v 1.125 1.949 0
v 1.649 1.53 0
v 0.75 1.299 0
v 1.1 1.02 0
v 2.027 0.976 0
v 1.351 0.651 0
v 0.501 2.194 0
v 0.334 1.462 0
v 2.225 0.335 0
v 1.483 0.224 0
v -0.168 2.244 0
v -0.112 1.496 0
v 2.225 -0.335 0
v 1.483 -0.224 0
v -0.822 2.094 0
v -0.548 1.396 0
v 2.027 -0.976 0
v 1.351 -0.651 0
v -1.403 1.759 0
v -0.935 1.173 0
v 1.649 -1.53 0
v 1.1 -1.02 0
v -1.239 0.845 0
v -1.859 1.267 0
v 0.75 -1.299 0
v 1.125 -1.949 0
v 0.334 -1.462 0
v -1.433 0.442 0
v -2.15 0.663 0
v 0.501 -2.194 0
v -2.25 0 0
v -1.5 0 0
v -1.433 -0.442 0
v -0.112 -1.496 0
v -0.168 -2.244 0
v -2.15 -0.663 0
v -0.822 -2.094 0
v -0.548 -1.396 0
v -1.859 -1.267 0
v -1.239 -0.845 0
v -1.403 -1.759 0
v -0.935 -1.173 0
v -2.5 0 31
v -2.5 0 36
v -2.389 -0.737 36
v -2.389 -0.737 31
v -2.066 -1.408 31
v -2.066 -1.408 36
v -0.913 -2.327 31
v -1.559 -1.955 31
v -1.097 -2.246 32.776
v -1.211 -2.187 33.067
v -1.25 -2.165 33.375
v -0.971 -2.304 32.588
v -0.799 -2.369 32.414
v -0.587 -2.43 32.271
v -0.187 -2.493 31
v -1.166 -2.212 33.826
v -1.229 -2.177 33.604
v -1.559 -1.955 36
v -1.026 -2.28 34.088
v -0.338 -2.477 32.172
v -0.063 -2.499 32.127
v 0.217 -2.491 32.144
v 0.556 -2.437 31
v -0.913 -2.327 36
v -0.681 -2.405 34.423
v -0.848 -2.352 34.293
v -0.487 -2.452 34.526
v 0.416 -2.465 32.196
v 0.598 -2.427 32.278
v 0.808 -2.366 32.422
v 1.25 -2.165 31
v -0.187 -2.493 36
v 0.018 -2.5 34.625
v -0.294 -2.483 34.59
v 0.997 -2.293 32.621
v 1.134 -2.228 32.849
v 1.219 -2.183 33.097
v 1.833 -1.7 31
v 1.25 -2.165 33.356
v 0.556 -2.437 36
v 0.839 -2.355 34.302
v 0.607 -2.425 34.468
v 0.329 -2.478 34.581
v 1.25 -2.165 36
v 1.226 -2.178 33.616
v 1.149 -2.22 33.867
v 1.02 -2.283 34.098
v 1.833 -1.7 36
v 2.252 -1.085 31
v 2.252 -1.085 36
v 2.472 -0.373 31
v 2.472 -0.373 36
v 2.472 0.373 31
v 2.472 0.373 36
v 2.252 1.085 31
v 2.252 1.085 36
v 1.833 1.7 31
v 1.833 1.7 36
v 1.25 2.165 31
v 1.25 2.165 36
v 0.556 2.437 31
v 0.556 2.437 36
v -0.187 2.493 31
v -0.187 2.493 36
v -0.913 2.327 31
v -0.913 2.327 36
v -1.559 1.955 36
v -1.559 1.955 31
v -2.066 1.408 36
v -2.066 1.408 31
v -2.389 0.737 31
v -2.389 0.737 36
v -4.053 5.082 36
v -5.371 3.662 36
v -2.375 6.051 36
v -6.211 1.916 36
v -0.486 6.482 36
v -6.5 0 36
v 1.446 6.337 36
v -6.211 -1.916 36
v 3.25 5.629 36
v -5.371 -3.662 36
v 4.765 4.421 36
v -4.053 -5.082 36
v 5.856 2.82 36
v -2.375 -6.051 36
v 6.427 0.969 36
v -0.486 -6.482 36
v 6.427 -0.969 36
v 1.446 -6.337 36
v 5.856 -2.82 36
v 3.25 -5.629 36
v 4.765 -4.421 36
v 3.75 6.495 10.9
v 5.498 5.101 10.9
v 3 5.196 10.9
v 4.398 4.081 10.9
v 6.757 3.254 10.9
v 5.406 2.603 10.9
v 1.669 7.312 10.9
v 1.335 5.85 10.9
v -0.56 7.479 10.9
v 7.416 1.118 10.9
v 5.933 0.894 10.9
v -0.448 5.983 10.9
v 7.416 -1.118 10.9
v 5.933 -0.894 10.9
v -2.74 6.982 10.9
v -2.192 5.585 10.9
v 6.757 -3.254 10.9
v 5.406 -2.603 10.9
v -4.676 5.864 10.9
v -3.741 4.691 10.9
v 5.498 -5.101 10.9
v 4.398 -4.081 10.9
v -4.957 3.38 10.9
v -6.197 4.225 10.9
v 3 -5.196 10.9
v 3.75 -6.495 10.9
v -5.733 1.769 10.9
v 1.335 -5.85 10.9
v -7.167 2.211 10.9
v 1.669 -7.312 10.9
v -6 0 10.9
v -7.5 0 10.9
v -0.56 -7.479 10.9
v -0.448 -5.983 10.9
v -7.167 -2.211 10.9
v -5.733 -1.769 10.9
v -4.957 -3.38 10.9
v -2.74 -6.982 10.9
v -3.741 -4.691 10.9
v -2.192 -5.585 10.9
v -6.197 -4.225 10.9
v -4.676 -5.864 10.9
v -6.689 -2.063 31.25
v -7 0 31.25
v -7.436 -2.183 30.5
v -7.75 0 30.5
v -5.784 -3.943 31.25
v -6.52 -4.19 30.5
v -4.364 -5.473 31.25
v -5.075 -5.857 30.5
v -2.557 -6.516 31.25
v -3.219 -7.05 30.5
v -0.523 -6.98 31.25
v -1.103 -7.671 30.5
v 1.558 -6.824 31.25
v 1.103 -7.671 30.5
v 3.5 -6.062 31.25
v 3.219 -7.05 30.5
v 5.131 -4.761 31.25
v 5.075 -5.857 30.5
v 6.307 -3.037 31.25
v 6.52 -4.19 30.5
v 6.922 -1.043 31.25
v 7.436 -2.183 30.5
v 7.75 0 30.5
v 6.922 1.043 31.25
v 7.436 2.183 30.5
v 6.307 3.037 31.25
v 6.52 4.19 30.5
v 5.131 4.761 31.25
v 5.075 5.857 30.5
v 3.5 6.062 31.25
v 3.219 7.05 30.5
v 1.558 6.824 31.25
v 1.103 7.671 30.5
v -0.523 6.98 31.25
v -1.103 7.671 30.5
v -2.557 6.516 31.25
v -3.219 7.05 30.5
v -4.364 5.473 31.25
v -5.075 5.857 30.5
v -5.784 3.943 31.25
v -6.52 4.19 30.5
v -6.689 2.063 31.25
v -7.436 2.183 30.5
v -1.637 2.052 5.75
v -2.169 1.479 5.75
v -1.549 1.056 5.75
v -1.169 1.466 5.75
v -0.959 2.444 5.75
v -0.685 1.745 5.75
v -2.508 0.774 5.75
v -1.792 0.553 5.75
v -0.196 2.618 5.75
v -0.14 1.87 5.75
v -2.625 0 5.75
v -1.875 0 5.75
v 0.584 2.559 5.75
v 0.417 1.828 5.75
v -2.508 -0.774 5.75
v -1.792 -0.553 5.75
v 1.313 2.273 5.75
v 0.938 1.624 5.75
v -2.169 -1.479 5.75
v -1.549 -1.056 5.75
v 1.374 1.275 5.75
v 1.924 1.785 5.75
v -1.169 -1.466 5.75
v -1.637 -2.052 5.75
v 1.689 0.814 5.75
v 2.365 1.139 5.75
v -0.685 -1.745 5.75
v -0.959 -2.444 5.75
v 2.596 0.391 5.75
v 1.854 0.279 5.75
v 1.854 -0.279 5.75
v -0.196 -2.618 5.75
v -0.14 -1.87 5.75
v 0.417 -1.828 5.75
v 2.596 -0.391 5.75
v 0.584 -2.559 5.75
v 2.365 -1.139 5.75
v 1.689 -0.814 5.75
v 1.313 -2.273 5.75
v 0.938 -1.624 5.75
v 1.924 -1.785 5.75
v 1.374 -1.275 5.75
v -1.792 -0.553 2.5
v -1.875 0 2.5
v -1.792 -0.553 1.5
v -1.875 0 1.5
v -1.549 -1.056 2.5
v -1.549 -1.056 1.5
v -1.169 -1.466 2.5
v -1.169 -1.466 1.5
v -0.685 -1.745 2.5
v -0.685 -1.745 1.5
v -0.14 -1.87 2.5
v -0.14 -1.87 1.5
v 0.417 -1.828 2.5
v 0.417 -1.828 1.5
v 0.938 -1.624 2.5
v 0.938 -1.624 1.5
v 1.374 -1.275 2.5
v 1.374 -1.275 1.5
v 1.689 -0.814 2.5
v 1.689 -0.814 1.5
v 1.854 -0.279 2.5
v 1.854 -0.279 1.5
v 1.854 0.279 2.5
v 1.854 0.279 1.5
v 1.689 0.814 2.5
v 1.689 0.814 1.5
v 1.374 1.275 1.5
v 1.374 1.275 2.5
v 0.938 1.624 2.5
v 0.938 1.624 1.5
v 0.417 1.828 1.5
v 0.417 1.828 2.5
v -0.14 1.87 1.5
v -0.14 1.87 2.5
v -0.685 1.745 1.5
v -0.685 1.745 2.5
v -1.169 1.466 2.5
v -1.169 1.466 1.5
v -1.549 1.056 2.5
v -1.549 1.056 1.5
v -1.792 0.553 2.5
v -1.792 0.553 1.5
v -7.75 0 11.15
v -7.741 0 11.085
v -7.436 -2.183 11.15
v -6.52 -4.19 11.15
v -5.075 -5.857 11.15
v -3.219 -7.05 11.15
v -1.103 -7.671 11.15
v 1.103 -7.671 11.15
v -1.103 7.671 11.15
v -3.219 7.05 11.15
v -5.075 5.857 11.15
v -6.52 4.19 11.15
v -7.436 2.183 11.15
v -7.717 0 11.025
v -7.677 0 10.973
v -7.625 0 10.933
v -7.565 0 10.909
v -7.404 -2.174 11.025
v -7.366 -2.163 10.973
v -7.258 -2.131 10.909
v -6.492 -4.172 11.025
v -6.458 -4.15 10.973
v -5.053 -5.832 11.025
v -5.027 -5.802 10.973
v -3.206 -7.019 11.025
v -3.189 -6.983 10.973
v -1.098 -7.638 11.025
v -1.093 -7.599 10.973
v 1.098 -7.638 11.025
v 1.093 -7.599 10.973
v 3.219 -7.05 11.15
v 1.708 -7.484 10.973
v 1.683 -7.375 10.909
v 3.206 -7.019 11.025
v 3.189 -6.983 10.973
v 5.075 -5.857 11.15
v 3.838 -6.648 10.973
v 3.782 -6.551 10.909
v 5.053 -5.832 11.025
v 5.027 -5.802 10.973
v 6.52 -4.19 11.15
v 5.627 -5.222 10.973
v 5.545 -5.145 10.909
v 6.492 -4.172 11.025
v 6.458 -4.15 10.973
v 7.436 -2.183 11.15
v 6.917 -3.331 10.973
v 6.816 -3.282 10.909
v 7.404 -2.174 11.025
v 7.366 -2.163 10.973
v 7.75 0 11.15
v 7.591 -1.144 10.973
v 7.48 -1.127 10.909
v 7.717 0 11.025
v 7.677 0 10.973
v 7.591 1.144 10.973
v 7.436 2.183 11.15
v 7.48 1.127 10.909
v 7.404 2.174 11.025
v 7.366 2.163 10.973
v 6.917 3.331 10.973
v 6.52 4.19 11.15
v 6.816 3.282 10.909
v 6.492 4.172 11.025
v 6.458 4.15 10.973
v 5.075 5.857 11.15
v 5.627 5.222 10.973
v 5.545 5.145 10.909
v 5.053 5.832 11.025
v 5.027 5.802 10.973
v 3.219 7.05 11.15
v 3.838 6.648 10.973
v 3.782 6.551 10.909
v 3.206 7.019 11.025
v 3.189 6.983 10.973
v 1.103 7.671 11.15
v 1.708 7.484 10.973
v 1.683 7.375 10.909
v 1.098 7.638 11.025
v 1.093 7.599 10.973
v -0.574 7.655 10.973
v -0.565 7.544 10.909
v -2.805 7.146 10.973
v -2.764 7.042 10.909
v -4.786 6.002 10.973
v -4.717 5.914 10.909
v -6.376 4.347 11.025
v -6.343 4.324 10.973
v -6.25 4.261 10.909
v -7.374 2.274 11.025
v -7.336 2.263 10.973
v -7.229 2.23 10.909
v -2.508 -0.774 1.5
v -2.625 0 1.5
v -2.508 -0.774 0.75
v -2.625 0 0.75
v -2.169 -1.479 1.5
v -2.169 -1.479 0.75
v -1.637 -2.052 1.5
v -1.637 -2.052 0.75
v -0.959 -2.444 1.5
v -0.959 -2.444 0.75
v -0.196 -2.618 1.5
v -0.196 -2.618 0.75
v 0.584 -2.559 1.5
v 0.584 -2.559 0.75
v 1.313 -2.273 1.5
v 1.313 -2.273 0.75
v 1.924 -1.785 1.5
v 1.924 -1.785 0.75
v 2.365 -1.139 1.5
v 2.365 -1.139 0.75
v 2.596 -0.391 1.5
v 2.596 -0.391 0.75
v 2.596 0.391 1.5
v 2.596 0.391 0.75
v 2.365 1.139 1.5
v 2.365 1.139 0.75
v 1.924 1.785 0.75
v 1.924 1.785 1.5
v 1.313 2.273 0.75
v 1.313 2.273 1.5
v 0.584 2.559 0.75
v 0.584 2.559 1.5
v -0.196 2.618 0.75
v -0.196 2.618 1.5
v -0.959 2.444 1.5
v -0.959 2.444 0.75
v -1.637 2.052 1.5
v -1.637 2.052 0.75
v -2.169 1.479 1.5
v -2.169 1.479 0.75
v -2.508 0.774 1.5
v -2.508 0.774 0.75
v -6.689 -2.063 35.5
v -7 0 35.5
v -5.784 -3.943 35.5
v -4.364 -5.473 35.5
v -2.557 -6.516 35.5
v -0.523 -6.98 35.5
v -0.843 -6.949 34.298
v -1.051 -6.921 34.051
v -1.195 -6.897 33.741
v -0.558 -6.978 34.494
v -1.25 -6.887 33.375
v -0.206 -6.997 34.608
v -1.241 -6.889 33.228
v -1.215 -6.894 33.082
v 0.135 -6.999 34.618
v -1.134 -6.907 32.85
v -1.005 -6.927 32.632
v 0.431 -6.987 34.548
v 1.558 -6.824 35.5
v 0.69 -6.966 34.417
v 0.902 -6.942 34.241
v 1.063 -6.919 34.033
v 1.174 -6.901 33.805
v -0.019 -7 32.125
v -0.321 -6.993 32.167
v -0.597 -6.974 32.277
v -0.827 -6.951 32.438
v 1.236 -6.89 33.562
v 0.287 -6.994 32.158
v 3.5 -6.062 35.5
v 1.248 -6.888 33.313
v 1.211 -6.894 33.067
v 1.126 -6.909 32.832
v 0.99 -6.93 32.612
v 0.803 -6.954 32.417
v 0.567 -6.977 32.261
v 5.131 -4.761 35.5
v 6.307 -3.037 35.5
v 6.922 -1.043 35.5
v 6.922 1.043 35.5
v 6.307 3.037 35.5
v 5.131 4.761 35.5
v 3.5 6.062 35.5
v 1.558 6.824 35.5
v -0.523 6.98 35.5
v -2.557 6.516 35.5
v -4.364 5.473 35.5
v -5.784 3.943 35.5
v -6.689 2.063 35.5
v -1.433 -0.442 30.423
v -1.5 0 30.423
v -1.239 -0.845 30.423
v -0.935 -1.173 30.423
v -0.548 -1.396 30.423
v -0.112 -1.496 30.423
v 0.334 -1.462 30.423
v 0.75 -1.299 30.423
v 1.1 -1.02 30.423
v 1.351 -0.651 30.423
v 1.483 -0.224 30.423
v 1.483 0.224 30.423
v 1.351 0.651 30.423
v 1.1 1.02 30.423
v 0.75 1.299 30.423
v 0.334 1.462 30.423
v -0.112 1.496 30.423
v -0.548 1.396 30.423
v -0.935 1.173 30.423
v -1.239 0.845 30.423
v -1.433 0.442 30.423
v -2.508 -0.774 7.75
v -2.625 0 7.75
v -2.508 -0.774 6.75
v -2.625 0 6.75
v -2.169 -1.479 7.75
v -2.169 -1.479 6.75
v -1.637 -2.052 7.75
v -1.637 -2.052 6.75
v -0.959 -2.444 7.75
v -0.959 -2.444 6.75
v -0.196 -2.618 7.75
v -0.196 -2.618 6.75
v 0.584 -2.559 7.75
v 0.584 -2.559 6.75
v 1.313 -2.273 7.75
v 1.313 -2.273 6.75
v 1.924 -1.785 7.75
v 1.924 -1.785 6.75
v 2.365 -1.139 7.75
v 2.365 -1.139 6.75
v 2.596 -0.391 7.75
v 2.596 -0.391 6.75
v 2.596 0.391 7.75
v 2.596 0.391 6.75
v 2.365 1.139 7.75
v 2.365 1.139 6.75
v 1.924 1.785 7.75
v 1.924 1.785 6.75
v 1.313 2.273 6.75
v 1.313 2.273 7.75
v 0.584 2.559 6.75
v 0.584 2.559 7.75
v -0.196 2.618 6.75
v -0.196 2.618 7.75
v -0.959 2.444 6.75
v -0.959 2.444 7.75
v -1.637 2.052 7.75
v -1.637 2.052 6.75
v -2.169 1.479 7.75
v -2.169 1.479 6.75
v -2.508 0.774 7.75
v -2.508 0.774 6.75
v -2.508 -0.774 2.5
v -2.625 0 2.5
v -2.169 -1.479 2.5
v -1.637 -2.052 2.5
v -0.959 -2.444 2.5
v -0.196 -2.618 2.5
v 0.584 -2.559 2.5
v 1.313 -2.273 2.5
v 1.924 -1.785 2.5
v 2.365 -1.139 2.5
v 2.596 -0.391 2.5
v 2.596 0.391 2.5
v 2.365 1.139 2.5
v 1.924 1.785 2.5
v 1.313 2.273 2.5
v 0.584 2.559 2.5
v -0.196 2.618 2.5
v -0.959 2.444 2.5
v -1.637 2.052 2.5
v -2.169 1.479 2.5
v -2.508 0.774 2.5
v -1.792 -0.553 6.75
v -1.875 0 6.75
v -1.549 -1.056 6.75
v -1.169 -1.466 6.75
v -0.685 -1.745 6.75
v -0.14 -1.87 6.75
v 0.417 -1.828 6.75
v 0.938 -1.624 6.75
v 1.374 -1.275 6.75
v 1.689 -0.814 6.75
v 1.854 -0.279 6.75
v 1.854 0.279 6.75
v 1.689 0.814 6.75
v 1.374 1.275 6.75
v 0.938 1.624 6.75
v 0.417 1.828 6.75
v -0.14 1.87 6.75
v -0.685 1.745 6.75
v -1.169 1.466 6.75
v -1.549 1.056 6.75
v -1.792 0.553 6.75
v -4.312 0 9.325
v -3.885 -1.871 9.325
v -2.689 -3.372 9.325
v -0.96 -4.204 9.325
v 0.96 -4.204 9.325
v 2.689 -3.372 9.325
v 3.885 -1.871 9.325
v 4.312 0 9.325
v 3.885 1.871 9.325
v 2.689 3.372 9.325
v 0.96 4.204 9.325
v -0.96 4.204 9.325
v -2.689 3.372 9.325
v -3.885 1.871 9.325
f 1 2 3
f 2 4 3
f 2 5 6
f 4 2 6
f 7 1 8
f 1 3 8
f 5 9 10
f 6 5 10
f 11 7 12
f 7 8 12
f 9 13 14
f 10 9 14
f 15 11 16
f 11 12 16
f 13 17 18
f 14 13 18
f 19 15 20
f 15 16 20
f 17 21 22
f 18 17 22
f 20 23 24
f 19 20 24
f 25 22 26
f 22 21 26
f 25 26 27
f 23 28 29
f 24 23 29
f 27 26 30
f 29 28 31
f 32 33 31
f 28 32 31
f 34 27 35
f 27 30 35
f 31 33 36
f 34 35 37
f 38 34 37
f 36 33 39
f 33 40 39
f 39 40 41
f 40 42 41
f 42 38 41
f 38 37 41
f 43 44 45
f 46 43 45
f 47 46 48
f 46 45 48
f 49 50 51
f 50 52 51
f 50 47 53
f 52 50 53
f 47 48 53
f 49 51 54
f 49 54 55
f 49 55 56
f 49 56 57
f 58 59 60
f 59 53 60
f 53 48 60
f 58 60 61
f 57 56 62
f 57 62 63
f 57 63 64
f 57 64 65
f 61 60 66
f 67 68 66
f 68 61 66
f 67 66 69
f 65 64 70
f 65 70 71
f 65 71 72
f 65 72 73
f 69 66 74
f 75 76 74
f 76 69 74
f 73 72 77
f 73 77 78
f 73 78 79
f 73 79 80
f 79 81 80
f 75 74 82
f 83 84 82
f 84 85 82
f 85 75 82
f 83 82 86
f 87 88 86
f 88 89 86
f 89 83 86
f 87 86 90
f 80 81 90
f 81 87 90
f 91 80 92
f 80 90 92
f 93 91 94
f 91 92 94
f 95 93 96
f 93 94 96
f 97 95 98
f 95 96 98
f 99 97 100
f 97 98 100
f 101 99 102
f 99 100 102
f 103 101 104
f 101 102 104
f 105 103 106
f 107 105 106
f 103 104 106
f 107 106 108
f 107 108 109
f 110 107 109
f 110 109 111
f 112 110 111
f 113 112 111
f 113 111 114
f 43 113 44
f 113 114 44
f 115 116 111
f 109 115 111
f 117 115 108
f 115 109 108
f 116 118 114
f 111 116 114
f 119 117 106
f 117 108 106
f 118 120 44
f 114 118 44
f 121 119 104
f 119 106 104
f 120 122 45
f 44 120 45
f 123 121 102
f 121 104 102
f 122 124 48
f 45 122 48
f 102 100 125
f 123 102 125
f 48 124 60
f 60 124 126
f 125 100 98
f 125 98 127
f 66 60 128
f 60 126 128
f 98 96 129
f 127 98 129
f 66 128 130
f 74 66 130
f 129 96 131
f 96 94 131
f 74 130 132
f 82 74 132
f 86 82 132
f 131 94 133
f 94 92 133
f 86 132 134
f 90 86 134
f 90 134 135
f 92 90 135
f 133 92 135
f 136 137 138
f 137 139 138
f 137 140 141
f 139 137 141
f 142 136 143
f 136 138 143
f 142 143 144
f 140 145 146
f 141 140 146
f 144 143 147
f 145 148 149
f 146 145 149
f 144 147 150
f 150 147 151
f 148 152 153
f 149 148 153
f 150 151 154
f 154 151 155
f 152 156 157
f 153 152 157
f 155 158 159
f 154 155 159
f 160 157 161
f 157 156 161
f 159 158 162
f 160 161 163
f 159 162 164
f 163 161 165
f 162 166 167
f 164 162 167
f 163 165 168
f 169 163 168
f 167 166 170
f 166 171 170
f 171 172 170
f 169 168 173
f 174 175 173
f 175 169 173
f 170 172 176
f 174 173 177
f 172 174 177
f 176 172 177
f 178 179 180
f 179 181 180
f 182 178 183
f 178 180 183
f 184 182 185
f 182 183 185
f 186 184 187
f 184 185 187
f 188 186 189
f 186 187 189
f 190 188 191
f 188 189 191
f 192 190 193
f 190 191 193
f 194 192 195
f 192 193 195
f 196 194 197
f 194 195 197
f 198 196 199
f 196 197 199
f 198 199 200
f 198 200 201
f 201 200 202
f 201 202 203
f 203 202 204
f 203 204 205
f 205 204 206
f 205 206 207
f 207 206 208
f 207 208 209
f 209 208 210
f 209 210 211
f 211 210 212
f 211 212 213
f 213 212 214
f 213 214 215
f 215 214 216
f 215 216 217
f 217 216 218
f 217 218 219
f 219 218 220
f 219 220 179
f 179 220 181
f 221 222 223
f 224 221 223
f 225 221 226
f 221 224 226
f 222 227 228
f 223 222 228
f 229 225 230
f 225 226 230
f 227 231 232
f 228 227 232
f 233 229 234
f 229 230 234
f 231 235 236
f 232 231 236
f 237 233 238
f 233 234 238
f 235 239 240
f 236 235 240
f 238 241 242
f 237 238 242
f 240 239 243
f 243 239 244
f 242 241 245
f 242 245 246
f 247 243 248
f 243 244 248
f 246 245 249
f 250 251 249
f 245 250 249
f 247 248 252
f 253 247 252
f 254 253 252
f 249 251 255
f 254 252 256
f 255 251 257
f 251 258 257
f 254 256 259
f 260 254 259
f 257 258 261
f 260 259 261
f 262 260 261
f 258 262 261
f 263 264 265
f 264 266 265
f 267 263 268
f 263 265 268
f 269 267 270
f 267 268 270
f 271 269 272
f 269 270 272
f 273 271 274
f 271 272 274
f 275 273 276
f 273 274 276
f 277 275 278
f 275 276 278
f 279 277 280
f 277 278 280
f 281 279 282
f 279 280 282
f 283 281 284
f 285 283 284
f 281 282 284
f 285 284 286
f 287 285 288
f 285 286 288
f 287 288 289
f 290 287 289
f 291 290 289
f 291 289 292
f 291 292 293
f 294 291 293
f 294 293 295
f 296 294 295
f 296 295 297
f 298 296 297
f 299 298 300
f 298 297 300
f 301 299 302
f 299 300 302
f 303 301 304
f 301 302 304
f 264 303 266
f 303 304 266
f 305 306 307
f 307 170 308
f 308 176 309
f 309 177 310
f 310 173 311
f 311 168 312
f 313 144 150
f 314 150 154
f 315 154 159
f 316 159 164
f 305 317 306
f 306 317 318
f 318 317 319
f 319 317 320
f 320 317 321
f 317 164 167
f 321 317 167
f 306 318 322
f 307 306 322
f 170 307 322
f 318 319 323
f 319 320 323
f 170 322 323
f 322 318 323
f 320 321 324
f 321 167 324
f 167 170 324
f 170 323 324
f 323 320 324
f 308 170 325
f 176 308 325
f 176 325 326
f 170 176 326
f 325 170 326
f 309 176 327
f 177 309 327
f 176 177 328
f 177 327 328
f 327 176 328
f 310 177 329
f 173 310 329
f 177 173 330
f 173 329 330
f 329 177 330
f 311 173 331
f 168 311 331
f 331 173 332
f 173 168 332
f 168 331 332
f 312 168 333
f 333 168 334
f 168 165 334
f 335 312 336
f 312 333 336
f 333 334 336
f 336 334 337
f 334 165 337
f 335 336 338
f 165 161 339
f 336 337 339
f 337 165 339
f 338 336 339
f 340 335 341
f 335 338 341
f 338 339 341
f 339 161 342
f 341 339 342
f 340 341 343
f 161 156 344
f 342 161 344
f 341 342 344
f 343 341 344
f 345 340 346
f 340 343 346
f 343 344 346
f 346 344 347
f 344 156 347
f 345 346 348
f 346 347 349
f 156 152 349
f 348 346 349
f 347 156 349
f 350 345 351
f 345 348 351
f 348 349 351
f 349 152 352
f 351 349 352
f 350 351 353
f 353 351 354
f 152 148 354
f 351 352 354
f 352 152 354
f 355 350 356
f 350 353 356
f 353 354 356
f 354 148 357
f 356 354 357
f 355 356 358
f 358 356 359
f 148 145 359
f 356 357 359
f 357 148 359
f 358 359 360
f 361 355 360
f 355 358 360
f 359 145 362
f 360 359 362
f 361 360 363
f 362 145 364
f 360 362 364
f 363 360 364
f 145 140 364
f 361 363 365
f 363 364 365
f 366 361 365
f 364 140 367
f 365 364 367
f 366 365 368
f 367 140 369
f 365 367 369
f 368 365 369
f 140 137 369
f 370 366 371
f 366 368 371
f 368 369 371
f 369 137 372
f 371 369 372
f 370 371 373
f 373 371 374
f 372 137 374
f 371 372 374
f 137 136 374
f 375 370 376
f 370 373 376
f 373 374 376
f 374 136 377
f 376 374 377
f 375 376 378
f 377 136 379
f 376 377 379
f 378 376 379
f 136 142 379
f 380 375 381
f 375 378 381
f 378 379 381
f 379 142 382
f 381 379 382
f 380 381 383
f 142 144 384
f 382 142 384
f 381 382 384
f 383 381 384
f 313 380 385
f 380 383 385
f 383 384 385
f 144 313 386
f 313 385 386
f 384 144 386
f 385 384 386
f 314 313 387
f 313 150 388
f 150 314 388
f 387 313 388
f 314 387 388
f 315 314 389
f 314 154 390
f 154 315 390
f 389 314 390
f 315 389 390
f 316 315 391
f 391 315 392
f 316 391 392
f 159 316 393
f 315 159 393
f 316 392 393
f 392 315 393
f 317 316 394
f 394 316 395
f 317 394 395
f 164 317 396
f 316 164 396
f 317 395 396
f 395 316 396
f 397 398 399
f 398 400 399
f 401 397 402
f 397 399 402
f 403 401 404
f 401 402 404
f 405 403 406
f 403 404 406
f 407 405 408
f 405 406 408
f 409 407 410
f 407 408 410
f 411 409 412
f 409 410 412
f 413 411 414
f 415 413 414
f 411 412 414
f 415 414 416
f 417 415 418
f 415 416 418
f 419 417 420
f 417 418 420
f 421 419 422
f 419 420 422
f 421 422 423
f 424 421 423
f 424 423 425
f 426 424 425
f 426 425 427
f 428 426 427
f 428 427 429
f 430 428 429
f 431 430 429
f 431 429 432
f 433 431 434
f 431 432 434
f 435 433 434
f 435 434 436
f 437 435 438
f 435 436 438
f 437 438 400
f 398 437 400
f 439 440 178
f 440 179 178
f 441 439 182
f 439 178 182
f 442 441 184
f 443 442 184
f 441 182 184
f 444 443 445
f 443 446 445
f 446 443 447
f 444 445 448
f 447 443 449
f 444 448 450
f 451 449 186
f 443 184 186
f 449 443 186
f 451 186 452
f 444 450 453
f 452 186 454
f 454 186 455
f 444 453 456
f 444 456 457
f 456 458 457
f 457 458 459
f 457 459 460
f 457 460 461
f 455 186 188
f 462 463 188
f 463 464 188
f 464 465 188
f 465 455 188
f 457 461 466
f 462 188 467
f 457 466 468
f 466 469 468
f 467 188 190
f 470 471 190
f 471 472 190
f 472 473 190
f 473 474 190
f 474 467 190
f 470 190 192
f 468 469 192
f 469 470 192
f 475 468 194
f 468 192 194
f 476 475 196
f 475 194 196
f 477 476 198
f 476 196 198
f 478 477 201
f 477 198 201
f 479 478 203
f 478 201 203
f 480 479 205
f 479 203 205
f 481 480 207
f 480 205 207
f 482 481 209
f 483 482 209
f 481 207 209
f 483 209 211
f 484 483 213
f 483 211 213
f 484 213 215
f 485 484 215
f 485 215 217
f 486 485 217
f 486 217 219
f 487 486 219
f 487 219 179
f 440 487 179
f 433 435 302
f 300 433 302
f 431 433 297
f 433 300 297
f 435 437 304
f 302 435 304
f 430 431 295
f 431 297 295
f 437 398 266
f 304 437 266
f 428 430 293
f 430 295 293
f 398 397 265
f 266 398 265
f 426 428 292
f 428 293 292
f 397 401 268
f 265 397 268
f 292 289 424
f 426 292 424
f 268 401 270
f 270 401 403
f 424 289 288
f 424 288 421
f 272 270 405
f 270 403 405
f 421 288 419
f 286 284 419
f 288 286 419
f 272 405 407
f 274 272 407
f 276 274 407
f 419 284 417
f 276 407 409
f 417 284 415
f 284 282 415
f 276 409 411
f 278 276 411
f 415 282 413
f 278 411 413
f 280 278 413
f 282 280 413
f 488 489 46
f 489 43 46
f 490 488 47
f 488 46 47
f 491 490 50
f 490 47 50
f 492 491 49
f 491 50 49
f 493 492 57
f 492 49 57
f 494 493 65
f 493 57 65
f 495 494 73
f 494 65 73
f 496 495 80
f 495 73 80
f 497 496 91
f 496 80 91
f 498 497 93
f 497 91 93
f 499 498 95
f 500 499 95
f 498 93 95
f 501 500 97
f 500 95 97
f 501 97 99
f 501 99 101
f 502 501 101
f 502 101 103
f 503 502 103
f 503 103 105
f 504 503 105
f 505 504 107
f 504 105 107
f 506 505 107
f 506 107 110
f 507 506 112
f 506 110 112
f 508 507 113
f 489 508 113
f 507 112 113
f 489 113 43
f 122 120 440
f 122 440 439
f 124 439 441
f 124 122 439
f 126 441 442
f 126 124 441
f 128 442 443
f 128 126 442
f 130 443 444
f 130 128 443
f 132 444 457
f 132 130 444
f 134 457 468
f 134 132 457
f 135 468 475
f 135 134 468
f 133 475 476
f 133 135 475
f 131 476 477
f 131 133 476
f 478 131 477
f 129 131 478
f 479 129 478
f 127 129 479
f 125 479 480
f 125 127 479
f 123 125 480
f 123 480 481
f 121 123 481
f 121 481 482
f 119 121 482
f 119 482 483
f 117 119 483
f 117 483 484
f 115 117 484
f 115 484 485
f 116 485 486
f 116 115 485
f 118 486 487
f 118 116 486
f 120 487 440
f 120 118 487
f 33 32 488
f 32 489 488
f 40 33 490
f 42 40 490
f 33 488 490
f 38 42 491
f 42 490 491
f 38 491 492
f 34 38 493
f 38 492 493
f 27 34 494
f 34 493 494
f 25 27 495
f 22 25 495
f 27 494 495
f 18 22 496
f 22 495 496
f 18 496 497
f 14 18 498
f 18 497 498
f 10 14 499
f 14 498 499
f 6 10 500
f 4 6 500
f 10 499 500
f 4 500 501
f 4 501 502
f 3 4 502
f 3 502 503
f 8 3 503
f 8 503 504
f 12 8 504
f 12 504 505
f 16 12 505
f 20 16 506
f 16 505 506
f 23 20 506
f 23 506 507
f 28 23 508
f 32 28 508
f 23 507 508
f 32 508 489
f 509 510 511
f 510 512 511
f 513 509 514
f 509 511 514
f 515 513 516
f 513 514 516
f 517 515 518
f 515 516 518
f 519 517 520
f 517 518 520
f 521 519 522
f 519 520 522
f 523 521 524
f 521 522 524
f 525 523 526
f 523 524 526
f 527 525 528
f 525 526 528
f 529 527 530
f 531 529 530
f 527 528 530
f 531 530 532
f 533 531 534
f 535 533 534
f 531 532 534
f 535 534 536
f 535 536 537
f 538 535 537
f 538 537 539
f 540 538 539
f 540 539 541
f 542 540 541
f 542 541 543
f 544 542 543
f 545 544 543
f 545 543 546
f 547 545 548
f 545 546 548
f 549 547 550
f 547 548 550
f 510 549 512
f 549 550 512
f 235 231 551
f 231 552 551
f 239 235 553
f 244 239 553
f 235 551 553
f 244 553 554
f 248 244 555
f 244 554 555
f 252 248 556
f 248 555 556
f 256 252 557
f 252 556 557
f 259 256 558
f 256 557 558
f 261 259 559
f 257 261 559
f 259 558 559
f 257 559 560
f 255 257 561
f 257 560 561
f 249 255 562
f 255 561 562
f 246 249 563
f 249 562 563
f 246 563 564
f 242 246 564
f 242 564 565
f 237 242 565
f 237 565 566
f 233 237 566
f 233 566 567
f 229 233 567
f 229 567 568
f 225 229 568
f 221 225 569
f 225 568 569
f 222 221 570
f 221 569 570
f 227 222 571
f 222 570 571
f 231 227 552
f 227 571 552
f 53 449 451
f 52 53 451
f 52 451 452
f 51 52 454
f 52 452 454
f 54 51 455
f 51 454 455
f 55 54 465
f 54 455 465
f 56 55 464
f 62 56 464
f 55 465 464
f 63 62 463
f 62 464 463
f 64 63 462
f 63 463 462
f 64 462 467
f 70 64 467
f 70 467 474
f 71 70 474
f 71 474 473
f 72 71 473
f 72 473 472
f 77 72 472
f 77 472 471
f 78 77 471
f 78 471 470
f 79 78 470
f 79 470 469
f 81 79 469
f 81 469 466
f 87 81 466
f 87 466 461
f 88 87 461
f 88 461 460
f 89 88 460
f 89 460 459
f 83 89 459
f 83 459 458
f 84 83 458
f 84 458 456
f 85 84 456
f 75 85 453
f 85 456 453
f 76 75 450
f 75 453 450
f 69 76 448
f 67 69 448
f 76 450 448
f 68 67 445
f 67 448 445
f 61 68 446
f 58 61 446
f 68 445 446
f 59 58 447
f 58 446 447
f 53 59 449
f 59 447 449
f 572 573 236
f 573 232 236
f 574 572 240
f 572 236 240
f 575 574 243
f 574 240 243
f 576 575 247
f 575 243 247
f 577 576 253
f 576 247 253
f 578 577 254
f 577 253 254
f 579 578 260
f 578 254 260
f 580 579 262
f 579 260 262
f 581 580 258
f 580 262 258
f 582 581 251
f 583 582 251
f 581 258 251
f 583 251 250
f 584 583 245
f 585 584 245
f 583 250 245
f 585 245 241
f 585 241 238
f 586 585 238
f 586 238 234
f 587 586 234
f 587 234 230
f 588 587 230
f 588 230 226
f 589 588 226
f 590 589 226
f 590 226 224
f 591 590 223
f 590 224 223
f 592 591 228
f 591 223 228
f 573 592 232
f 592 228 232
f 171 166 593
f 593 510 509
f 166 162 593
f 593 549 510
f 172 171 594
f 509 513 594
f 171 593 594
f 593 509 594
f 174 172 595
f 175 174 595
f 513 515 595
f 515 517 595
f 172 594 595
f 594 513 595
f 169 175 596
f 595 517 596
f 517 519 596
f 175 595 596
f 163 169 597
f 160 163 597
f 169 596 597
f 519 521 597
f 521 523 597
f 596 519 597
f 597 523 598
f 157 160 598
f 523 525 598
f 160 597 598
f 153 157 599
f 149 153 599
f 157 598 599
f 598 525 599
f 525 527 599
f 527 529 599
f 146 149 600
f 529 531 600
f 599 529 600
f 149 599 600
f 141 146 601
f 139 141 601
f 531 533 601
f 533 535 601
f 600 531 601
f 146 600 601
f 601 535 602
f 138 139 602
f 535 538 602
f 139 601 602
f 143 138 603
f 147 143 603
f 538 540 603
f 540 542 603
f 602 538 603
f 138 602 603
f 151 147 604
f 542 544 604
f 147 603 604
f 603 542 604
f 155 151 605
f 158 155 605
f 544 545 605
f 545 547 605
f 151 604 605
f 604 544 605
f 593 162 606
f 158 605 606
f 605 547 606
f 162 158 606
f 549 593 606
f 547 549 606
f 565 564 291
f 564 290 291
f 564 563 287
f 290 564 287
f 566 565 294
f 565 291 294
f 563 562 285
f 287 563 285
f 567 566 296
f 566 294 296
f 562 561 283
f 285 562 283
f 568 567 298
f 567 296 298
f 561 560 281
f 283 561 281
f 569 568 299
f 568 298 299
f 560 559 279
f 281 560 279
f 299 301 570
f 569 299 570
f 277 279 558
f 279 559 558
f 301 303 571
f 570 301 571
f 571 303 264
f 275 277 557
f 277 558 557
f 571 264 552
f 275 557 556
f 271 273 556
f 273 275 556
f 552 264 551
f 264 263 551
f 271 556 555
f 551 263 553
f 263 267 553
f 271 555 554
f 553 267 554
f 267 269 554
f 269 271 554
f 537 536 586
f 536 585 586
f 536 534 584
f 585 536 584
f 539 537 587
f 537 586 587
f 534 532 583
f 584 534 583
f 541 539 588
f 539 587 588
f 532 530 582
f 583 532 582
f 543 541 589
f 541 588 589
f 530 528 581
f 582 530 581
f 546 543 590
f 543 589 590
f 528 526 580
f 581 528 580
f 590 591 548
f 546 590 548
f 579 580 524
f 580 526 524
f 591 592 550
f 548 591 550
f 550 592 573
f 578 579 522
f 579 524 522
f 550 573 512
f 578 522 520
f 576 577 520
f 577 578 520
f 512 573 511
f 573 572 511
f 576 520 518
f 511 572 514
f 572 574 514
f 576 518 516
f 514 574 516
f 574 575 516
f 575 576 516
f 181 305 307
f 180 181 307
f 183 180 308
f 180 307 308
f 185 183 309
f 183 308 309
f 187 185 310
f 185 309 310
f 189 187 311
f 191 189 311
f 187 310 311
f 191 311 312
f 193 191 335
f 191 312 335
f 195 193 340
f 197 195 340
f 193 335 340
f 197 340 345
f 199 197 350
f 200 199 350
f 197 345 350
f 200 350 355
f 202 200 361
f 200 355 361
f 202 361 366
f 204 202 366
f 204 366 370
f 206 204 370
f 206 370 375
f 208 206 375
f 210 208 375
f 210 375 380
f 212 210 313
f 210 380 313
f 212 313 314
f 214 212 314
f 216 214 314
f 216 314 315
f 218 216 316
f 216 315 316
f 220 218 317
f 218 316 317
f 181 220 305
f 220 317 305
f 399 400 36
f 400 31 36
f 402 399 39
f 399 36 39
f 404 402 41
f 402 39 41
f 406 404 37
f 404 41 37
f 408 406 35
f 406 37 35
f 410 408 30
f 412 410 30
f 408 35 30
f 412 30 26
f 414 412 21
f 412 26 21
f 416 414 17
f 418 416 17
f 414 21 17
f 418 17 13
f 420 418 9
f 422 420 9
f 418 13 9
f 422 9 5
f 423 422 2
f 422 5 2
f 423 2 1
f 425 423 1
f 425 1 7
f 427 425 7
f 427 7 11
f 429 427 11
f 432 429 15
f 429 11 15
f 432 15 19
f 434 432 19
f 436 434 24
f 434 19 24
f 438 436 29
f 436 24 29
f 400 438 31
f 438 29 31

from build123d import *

# Parameters (mm, degrees)
OUTSIDE_BOTTOM_FILLET_R   = 0.25
TOP_CHAMFER_SIZE          = 0.5
M3X0_5_TAPPED_HOLE_REACH  = 39.303
M3X0_5_TAPPED_HOLE_BORE_R = 1.25


with BuildPart() as part:
    # Body Sketch → Body Revolve (revolve)
    with BuildSketch(Plane(origin=(0, 0, 0), x_dir=(1, 0, 0), z_dir=(0, 1, 0)), mode=Mode.PRIVATE) as body_revolve_sk:
        Polygon((2.5, -36), (7, -36), (7, -31.25), (7.75, -30.5), (7.75, -10.9), (6, -10.9), (2.625, -7.75), (2.625, -6.75), (1.875, -6.75), (1.875, -5.75), (2.625, -5.75), (2.625, -2.5), (1.875, -2.5), (1.875, -1.5), (2.625, -1.5), (2.625, -0.75), (2.25, 0), (1.5, 0), (1.5, -30.422649731), (2.5, -31), align=None)
    revolve(body_revolve_sk.sketch.rotate(Axis((0, 0, 0), (0, 0, 1)), 180), axis=Axis((0, 0, 0), (0, 0, 1)))

    # Outside Bottom Fillet
    outside_bottom_fillet_edges = [part.edges().sort_by_distance(p)[0] for p in [
        (7.75, 0, 10.9),
    ]]
    fillet(outside_bottom_fillet_edges, radius=OUTSIDE_BOTTOM_FILLET_R)

    # Top Chamfer
    top_chamfer_edges = [part.edges().sort_by_distance(p)[0] for p in [
        (7, 0, 36),
    ]]
    chamfer(top_chamfer_edges, length=TOP_CHAMFER_SIZE)

    # M3x0.5 Tapped Hole bore (on position points) → M3x0.5 Tapped Hole (cut, up to next)
    with BuildSketch(Plane(origin=(0, -7, 33.375), x_dir=(-1, 0, 0), z_dir=(0, -1, 0)), mode=Mode.PRIVATE) as m3x0_5_tapped_hole_sk1:
        Circle(M3X0_5_TAPPED_HOLE_BORE_R)
    m3x0_5_tapped_hole_tool1 = extrude(m3x0_5_tapped_hole_sk1.sketch, amount=-M3X0_5_TAPPED_HOLE_REACH, mode=Mode.PRIVATE) & part.part
    add(m3x0_5_tapped_hole_tool1.solids().sort_by_distance((0, -7, 33.375))[0], mode=Mode.SUBTRACT)


solid = part.part
